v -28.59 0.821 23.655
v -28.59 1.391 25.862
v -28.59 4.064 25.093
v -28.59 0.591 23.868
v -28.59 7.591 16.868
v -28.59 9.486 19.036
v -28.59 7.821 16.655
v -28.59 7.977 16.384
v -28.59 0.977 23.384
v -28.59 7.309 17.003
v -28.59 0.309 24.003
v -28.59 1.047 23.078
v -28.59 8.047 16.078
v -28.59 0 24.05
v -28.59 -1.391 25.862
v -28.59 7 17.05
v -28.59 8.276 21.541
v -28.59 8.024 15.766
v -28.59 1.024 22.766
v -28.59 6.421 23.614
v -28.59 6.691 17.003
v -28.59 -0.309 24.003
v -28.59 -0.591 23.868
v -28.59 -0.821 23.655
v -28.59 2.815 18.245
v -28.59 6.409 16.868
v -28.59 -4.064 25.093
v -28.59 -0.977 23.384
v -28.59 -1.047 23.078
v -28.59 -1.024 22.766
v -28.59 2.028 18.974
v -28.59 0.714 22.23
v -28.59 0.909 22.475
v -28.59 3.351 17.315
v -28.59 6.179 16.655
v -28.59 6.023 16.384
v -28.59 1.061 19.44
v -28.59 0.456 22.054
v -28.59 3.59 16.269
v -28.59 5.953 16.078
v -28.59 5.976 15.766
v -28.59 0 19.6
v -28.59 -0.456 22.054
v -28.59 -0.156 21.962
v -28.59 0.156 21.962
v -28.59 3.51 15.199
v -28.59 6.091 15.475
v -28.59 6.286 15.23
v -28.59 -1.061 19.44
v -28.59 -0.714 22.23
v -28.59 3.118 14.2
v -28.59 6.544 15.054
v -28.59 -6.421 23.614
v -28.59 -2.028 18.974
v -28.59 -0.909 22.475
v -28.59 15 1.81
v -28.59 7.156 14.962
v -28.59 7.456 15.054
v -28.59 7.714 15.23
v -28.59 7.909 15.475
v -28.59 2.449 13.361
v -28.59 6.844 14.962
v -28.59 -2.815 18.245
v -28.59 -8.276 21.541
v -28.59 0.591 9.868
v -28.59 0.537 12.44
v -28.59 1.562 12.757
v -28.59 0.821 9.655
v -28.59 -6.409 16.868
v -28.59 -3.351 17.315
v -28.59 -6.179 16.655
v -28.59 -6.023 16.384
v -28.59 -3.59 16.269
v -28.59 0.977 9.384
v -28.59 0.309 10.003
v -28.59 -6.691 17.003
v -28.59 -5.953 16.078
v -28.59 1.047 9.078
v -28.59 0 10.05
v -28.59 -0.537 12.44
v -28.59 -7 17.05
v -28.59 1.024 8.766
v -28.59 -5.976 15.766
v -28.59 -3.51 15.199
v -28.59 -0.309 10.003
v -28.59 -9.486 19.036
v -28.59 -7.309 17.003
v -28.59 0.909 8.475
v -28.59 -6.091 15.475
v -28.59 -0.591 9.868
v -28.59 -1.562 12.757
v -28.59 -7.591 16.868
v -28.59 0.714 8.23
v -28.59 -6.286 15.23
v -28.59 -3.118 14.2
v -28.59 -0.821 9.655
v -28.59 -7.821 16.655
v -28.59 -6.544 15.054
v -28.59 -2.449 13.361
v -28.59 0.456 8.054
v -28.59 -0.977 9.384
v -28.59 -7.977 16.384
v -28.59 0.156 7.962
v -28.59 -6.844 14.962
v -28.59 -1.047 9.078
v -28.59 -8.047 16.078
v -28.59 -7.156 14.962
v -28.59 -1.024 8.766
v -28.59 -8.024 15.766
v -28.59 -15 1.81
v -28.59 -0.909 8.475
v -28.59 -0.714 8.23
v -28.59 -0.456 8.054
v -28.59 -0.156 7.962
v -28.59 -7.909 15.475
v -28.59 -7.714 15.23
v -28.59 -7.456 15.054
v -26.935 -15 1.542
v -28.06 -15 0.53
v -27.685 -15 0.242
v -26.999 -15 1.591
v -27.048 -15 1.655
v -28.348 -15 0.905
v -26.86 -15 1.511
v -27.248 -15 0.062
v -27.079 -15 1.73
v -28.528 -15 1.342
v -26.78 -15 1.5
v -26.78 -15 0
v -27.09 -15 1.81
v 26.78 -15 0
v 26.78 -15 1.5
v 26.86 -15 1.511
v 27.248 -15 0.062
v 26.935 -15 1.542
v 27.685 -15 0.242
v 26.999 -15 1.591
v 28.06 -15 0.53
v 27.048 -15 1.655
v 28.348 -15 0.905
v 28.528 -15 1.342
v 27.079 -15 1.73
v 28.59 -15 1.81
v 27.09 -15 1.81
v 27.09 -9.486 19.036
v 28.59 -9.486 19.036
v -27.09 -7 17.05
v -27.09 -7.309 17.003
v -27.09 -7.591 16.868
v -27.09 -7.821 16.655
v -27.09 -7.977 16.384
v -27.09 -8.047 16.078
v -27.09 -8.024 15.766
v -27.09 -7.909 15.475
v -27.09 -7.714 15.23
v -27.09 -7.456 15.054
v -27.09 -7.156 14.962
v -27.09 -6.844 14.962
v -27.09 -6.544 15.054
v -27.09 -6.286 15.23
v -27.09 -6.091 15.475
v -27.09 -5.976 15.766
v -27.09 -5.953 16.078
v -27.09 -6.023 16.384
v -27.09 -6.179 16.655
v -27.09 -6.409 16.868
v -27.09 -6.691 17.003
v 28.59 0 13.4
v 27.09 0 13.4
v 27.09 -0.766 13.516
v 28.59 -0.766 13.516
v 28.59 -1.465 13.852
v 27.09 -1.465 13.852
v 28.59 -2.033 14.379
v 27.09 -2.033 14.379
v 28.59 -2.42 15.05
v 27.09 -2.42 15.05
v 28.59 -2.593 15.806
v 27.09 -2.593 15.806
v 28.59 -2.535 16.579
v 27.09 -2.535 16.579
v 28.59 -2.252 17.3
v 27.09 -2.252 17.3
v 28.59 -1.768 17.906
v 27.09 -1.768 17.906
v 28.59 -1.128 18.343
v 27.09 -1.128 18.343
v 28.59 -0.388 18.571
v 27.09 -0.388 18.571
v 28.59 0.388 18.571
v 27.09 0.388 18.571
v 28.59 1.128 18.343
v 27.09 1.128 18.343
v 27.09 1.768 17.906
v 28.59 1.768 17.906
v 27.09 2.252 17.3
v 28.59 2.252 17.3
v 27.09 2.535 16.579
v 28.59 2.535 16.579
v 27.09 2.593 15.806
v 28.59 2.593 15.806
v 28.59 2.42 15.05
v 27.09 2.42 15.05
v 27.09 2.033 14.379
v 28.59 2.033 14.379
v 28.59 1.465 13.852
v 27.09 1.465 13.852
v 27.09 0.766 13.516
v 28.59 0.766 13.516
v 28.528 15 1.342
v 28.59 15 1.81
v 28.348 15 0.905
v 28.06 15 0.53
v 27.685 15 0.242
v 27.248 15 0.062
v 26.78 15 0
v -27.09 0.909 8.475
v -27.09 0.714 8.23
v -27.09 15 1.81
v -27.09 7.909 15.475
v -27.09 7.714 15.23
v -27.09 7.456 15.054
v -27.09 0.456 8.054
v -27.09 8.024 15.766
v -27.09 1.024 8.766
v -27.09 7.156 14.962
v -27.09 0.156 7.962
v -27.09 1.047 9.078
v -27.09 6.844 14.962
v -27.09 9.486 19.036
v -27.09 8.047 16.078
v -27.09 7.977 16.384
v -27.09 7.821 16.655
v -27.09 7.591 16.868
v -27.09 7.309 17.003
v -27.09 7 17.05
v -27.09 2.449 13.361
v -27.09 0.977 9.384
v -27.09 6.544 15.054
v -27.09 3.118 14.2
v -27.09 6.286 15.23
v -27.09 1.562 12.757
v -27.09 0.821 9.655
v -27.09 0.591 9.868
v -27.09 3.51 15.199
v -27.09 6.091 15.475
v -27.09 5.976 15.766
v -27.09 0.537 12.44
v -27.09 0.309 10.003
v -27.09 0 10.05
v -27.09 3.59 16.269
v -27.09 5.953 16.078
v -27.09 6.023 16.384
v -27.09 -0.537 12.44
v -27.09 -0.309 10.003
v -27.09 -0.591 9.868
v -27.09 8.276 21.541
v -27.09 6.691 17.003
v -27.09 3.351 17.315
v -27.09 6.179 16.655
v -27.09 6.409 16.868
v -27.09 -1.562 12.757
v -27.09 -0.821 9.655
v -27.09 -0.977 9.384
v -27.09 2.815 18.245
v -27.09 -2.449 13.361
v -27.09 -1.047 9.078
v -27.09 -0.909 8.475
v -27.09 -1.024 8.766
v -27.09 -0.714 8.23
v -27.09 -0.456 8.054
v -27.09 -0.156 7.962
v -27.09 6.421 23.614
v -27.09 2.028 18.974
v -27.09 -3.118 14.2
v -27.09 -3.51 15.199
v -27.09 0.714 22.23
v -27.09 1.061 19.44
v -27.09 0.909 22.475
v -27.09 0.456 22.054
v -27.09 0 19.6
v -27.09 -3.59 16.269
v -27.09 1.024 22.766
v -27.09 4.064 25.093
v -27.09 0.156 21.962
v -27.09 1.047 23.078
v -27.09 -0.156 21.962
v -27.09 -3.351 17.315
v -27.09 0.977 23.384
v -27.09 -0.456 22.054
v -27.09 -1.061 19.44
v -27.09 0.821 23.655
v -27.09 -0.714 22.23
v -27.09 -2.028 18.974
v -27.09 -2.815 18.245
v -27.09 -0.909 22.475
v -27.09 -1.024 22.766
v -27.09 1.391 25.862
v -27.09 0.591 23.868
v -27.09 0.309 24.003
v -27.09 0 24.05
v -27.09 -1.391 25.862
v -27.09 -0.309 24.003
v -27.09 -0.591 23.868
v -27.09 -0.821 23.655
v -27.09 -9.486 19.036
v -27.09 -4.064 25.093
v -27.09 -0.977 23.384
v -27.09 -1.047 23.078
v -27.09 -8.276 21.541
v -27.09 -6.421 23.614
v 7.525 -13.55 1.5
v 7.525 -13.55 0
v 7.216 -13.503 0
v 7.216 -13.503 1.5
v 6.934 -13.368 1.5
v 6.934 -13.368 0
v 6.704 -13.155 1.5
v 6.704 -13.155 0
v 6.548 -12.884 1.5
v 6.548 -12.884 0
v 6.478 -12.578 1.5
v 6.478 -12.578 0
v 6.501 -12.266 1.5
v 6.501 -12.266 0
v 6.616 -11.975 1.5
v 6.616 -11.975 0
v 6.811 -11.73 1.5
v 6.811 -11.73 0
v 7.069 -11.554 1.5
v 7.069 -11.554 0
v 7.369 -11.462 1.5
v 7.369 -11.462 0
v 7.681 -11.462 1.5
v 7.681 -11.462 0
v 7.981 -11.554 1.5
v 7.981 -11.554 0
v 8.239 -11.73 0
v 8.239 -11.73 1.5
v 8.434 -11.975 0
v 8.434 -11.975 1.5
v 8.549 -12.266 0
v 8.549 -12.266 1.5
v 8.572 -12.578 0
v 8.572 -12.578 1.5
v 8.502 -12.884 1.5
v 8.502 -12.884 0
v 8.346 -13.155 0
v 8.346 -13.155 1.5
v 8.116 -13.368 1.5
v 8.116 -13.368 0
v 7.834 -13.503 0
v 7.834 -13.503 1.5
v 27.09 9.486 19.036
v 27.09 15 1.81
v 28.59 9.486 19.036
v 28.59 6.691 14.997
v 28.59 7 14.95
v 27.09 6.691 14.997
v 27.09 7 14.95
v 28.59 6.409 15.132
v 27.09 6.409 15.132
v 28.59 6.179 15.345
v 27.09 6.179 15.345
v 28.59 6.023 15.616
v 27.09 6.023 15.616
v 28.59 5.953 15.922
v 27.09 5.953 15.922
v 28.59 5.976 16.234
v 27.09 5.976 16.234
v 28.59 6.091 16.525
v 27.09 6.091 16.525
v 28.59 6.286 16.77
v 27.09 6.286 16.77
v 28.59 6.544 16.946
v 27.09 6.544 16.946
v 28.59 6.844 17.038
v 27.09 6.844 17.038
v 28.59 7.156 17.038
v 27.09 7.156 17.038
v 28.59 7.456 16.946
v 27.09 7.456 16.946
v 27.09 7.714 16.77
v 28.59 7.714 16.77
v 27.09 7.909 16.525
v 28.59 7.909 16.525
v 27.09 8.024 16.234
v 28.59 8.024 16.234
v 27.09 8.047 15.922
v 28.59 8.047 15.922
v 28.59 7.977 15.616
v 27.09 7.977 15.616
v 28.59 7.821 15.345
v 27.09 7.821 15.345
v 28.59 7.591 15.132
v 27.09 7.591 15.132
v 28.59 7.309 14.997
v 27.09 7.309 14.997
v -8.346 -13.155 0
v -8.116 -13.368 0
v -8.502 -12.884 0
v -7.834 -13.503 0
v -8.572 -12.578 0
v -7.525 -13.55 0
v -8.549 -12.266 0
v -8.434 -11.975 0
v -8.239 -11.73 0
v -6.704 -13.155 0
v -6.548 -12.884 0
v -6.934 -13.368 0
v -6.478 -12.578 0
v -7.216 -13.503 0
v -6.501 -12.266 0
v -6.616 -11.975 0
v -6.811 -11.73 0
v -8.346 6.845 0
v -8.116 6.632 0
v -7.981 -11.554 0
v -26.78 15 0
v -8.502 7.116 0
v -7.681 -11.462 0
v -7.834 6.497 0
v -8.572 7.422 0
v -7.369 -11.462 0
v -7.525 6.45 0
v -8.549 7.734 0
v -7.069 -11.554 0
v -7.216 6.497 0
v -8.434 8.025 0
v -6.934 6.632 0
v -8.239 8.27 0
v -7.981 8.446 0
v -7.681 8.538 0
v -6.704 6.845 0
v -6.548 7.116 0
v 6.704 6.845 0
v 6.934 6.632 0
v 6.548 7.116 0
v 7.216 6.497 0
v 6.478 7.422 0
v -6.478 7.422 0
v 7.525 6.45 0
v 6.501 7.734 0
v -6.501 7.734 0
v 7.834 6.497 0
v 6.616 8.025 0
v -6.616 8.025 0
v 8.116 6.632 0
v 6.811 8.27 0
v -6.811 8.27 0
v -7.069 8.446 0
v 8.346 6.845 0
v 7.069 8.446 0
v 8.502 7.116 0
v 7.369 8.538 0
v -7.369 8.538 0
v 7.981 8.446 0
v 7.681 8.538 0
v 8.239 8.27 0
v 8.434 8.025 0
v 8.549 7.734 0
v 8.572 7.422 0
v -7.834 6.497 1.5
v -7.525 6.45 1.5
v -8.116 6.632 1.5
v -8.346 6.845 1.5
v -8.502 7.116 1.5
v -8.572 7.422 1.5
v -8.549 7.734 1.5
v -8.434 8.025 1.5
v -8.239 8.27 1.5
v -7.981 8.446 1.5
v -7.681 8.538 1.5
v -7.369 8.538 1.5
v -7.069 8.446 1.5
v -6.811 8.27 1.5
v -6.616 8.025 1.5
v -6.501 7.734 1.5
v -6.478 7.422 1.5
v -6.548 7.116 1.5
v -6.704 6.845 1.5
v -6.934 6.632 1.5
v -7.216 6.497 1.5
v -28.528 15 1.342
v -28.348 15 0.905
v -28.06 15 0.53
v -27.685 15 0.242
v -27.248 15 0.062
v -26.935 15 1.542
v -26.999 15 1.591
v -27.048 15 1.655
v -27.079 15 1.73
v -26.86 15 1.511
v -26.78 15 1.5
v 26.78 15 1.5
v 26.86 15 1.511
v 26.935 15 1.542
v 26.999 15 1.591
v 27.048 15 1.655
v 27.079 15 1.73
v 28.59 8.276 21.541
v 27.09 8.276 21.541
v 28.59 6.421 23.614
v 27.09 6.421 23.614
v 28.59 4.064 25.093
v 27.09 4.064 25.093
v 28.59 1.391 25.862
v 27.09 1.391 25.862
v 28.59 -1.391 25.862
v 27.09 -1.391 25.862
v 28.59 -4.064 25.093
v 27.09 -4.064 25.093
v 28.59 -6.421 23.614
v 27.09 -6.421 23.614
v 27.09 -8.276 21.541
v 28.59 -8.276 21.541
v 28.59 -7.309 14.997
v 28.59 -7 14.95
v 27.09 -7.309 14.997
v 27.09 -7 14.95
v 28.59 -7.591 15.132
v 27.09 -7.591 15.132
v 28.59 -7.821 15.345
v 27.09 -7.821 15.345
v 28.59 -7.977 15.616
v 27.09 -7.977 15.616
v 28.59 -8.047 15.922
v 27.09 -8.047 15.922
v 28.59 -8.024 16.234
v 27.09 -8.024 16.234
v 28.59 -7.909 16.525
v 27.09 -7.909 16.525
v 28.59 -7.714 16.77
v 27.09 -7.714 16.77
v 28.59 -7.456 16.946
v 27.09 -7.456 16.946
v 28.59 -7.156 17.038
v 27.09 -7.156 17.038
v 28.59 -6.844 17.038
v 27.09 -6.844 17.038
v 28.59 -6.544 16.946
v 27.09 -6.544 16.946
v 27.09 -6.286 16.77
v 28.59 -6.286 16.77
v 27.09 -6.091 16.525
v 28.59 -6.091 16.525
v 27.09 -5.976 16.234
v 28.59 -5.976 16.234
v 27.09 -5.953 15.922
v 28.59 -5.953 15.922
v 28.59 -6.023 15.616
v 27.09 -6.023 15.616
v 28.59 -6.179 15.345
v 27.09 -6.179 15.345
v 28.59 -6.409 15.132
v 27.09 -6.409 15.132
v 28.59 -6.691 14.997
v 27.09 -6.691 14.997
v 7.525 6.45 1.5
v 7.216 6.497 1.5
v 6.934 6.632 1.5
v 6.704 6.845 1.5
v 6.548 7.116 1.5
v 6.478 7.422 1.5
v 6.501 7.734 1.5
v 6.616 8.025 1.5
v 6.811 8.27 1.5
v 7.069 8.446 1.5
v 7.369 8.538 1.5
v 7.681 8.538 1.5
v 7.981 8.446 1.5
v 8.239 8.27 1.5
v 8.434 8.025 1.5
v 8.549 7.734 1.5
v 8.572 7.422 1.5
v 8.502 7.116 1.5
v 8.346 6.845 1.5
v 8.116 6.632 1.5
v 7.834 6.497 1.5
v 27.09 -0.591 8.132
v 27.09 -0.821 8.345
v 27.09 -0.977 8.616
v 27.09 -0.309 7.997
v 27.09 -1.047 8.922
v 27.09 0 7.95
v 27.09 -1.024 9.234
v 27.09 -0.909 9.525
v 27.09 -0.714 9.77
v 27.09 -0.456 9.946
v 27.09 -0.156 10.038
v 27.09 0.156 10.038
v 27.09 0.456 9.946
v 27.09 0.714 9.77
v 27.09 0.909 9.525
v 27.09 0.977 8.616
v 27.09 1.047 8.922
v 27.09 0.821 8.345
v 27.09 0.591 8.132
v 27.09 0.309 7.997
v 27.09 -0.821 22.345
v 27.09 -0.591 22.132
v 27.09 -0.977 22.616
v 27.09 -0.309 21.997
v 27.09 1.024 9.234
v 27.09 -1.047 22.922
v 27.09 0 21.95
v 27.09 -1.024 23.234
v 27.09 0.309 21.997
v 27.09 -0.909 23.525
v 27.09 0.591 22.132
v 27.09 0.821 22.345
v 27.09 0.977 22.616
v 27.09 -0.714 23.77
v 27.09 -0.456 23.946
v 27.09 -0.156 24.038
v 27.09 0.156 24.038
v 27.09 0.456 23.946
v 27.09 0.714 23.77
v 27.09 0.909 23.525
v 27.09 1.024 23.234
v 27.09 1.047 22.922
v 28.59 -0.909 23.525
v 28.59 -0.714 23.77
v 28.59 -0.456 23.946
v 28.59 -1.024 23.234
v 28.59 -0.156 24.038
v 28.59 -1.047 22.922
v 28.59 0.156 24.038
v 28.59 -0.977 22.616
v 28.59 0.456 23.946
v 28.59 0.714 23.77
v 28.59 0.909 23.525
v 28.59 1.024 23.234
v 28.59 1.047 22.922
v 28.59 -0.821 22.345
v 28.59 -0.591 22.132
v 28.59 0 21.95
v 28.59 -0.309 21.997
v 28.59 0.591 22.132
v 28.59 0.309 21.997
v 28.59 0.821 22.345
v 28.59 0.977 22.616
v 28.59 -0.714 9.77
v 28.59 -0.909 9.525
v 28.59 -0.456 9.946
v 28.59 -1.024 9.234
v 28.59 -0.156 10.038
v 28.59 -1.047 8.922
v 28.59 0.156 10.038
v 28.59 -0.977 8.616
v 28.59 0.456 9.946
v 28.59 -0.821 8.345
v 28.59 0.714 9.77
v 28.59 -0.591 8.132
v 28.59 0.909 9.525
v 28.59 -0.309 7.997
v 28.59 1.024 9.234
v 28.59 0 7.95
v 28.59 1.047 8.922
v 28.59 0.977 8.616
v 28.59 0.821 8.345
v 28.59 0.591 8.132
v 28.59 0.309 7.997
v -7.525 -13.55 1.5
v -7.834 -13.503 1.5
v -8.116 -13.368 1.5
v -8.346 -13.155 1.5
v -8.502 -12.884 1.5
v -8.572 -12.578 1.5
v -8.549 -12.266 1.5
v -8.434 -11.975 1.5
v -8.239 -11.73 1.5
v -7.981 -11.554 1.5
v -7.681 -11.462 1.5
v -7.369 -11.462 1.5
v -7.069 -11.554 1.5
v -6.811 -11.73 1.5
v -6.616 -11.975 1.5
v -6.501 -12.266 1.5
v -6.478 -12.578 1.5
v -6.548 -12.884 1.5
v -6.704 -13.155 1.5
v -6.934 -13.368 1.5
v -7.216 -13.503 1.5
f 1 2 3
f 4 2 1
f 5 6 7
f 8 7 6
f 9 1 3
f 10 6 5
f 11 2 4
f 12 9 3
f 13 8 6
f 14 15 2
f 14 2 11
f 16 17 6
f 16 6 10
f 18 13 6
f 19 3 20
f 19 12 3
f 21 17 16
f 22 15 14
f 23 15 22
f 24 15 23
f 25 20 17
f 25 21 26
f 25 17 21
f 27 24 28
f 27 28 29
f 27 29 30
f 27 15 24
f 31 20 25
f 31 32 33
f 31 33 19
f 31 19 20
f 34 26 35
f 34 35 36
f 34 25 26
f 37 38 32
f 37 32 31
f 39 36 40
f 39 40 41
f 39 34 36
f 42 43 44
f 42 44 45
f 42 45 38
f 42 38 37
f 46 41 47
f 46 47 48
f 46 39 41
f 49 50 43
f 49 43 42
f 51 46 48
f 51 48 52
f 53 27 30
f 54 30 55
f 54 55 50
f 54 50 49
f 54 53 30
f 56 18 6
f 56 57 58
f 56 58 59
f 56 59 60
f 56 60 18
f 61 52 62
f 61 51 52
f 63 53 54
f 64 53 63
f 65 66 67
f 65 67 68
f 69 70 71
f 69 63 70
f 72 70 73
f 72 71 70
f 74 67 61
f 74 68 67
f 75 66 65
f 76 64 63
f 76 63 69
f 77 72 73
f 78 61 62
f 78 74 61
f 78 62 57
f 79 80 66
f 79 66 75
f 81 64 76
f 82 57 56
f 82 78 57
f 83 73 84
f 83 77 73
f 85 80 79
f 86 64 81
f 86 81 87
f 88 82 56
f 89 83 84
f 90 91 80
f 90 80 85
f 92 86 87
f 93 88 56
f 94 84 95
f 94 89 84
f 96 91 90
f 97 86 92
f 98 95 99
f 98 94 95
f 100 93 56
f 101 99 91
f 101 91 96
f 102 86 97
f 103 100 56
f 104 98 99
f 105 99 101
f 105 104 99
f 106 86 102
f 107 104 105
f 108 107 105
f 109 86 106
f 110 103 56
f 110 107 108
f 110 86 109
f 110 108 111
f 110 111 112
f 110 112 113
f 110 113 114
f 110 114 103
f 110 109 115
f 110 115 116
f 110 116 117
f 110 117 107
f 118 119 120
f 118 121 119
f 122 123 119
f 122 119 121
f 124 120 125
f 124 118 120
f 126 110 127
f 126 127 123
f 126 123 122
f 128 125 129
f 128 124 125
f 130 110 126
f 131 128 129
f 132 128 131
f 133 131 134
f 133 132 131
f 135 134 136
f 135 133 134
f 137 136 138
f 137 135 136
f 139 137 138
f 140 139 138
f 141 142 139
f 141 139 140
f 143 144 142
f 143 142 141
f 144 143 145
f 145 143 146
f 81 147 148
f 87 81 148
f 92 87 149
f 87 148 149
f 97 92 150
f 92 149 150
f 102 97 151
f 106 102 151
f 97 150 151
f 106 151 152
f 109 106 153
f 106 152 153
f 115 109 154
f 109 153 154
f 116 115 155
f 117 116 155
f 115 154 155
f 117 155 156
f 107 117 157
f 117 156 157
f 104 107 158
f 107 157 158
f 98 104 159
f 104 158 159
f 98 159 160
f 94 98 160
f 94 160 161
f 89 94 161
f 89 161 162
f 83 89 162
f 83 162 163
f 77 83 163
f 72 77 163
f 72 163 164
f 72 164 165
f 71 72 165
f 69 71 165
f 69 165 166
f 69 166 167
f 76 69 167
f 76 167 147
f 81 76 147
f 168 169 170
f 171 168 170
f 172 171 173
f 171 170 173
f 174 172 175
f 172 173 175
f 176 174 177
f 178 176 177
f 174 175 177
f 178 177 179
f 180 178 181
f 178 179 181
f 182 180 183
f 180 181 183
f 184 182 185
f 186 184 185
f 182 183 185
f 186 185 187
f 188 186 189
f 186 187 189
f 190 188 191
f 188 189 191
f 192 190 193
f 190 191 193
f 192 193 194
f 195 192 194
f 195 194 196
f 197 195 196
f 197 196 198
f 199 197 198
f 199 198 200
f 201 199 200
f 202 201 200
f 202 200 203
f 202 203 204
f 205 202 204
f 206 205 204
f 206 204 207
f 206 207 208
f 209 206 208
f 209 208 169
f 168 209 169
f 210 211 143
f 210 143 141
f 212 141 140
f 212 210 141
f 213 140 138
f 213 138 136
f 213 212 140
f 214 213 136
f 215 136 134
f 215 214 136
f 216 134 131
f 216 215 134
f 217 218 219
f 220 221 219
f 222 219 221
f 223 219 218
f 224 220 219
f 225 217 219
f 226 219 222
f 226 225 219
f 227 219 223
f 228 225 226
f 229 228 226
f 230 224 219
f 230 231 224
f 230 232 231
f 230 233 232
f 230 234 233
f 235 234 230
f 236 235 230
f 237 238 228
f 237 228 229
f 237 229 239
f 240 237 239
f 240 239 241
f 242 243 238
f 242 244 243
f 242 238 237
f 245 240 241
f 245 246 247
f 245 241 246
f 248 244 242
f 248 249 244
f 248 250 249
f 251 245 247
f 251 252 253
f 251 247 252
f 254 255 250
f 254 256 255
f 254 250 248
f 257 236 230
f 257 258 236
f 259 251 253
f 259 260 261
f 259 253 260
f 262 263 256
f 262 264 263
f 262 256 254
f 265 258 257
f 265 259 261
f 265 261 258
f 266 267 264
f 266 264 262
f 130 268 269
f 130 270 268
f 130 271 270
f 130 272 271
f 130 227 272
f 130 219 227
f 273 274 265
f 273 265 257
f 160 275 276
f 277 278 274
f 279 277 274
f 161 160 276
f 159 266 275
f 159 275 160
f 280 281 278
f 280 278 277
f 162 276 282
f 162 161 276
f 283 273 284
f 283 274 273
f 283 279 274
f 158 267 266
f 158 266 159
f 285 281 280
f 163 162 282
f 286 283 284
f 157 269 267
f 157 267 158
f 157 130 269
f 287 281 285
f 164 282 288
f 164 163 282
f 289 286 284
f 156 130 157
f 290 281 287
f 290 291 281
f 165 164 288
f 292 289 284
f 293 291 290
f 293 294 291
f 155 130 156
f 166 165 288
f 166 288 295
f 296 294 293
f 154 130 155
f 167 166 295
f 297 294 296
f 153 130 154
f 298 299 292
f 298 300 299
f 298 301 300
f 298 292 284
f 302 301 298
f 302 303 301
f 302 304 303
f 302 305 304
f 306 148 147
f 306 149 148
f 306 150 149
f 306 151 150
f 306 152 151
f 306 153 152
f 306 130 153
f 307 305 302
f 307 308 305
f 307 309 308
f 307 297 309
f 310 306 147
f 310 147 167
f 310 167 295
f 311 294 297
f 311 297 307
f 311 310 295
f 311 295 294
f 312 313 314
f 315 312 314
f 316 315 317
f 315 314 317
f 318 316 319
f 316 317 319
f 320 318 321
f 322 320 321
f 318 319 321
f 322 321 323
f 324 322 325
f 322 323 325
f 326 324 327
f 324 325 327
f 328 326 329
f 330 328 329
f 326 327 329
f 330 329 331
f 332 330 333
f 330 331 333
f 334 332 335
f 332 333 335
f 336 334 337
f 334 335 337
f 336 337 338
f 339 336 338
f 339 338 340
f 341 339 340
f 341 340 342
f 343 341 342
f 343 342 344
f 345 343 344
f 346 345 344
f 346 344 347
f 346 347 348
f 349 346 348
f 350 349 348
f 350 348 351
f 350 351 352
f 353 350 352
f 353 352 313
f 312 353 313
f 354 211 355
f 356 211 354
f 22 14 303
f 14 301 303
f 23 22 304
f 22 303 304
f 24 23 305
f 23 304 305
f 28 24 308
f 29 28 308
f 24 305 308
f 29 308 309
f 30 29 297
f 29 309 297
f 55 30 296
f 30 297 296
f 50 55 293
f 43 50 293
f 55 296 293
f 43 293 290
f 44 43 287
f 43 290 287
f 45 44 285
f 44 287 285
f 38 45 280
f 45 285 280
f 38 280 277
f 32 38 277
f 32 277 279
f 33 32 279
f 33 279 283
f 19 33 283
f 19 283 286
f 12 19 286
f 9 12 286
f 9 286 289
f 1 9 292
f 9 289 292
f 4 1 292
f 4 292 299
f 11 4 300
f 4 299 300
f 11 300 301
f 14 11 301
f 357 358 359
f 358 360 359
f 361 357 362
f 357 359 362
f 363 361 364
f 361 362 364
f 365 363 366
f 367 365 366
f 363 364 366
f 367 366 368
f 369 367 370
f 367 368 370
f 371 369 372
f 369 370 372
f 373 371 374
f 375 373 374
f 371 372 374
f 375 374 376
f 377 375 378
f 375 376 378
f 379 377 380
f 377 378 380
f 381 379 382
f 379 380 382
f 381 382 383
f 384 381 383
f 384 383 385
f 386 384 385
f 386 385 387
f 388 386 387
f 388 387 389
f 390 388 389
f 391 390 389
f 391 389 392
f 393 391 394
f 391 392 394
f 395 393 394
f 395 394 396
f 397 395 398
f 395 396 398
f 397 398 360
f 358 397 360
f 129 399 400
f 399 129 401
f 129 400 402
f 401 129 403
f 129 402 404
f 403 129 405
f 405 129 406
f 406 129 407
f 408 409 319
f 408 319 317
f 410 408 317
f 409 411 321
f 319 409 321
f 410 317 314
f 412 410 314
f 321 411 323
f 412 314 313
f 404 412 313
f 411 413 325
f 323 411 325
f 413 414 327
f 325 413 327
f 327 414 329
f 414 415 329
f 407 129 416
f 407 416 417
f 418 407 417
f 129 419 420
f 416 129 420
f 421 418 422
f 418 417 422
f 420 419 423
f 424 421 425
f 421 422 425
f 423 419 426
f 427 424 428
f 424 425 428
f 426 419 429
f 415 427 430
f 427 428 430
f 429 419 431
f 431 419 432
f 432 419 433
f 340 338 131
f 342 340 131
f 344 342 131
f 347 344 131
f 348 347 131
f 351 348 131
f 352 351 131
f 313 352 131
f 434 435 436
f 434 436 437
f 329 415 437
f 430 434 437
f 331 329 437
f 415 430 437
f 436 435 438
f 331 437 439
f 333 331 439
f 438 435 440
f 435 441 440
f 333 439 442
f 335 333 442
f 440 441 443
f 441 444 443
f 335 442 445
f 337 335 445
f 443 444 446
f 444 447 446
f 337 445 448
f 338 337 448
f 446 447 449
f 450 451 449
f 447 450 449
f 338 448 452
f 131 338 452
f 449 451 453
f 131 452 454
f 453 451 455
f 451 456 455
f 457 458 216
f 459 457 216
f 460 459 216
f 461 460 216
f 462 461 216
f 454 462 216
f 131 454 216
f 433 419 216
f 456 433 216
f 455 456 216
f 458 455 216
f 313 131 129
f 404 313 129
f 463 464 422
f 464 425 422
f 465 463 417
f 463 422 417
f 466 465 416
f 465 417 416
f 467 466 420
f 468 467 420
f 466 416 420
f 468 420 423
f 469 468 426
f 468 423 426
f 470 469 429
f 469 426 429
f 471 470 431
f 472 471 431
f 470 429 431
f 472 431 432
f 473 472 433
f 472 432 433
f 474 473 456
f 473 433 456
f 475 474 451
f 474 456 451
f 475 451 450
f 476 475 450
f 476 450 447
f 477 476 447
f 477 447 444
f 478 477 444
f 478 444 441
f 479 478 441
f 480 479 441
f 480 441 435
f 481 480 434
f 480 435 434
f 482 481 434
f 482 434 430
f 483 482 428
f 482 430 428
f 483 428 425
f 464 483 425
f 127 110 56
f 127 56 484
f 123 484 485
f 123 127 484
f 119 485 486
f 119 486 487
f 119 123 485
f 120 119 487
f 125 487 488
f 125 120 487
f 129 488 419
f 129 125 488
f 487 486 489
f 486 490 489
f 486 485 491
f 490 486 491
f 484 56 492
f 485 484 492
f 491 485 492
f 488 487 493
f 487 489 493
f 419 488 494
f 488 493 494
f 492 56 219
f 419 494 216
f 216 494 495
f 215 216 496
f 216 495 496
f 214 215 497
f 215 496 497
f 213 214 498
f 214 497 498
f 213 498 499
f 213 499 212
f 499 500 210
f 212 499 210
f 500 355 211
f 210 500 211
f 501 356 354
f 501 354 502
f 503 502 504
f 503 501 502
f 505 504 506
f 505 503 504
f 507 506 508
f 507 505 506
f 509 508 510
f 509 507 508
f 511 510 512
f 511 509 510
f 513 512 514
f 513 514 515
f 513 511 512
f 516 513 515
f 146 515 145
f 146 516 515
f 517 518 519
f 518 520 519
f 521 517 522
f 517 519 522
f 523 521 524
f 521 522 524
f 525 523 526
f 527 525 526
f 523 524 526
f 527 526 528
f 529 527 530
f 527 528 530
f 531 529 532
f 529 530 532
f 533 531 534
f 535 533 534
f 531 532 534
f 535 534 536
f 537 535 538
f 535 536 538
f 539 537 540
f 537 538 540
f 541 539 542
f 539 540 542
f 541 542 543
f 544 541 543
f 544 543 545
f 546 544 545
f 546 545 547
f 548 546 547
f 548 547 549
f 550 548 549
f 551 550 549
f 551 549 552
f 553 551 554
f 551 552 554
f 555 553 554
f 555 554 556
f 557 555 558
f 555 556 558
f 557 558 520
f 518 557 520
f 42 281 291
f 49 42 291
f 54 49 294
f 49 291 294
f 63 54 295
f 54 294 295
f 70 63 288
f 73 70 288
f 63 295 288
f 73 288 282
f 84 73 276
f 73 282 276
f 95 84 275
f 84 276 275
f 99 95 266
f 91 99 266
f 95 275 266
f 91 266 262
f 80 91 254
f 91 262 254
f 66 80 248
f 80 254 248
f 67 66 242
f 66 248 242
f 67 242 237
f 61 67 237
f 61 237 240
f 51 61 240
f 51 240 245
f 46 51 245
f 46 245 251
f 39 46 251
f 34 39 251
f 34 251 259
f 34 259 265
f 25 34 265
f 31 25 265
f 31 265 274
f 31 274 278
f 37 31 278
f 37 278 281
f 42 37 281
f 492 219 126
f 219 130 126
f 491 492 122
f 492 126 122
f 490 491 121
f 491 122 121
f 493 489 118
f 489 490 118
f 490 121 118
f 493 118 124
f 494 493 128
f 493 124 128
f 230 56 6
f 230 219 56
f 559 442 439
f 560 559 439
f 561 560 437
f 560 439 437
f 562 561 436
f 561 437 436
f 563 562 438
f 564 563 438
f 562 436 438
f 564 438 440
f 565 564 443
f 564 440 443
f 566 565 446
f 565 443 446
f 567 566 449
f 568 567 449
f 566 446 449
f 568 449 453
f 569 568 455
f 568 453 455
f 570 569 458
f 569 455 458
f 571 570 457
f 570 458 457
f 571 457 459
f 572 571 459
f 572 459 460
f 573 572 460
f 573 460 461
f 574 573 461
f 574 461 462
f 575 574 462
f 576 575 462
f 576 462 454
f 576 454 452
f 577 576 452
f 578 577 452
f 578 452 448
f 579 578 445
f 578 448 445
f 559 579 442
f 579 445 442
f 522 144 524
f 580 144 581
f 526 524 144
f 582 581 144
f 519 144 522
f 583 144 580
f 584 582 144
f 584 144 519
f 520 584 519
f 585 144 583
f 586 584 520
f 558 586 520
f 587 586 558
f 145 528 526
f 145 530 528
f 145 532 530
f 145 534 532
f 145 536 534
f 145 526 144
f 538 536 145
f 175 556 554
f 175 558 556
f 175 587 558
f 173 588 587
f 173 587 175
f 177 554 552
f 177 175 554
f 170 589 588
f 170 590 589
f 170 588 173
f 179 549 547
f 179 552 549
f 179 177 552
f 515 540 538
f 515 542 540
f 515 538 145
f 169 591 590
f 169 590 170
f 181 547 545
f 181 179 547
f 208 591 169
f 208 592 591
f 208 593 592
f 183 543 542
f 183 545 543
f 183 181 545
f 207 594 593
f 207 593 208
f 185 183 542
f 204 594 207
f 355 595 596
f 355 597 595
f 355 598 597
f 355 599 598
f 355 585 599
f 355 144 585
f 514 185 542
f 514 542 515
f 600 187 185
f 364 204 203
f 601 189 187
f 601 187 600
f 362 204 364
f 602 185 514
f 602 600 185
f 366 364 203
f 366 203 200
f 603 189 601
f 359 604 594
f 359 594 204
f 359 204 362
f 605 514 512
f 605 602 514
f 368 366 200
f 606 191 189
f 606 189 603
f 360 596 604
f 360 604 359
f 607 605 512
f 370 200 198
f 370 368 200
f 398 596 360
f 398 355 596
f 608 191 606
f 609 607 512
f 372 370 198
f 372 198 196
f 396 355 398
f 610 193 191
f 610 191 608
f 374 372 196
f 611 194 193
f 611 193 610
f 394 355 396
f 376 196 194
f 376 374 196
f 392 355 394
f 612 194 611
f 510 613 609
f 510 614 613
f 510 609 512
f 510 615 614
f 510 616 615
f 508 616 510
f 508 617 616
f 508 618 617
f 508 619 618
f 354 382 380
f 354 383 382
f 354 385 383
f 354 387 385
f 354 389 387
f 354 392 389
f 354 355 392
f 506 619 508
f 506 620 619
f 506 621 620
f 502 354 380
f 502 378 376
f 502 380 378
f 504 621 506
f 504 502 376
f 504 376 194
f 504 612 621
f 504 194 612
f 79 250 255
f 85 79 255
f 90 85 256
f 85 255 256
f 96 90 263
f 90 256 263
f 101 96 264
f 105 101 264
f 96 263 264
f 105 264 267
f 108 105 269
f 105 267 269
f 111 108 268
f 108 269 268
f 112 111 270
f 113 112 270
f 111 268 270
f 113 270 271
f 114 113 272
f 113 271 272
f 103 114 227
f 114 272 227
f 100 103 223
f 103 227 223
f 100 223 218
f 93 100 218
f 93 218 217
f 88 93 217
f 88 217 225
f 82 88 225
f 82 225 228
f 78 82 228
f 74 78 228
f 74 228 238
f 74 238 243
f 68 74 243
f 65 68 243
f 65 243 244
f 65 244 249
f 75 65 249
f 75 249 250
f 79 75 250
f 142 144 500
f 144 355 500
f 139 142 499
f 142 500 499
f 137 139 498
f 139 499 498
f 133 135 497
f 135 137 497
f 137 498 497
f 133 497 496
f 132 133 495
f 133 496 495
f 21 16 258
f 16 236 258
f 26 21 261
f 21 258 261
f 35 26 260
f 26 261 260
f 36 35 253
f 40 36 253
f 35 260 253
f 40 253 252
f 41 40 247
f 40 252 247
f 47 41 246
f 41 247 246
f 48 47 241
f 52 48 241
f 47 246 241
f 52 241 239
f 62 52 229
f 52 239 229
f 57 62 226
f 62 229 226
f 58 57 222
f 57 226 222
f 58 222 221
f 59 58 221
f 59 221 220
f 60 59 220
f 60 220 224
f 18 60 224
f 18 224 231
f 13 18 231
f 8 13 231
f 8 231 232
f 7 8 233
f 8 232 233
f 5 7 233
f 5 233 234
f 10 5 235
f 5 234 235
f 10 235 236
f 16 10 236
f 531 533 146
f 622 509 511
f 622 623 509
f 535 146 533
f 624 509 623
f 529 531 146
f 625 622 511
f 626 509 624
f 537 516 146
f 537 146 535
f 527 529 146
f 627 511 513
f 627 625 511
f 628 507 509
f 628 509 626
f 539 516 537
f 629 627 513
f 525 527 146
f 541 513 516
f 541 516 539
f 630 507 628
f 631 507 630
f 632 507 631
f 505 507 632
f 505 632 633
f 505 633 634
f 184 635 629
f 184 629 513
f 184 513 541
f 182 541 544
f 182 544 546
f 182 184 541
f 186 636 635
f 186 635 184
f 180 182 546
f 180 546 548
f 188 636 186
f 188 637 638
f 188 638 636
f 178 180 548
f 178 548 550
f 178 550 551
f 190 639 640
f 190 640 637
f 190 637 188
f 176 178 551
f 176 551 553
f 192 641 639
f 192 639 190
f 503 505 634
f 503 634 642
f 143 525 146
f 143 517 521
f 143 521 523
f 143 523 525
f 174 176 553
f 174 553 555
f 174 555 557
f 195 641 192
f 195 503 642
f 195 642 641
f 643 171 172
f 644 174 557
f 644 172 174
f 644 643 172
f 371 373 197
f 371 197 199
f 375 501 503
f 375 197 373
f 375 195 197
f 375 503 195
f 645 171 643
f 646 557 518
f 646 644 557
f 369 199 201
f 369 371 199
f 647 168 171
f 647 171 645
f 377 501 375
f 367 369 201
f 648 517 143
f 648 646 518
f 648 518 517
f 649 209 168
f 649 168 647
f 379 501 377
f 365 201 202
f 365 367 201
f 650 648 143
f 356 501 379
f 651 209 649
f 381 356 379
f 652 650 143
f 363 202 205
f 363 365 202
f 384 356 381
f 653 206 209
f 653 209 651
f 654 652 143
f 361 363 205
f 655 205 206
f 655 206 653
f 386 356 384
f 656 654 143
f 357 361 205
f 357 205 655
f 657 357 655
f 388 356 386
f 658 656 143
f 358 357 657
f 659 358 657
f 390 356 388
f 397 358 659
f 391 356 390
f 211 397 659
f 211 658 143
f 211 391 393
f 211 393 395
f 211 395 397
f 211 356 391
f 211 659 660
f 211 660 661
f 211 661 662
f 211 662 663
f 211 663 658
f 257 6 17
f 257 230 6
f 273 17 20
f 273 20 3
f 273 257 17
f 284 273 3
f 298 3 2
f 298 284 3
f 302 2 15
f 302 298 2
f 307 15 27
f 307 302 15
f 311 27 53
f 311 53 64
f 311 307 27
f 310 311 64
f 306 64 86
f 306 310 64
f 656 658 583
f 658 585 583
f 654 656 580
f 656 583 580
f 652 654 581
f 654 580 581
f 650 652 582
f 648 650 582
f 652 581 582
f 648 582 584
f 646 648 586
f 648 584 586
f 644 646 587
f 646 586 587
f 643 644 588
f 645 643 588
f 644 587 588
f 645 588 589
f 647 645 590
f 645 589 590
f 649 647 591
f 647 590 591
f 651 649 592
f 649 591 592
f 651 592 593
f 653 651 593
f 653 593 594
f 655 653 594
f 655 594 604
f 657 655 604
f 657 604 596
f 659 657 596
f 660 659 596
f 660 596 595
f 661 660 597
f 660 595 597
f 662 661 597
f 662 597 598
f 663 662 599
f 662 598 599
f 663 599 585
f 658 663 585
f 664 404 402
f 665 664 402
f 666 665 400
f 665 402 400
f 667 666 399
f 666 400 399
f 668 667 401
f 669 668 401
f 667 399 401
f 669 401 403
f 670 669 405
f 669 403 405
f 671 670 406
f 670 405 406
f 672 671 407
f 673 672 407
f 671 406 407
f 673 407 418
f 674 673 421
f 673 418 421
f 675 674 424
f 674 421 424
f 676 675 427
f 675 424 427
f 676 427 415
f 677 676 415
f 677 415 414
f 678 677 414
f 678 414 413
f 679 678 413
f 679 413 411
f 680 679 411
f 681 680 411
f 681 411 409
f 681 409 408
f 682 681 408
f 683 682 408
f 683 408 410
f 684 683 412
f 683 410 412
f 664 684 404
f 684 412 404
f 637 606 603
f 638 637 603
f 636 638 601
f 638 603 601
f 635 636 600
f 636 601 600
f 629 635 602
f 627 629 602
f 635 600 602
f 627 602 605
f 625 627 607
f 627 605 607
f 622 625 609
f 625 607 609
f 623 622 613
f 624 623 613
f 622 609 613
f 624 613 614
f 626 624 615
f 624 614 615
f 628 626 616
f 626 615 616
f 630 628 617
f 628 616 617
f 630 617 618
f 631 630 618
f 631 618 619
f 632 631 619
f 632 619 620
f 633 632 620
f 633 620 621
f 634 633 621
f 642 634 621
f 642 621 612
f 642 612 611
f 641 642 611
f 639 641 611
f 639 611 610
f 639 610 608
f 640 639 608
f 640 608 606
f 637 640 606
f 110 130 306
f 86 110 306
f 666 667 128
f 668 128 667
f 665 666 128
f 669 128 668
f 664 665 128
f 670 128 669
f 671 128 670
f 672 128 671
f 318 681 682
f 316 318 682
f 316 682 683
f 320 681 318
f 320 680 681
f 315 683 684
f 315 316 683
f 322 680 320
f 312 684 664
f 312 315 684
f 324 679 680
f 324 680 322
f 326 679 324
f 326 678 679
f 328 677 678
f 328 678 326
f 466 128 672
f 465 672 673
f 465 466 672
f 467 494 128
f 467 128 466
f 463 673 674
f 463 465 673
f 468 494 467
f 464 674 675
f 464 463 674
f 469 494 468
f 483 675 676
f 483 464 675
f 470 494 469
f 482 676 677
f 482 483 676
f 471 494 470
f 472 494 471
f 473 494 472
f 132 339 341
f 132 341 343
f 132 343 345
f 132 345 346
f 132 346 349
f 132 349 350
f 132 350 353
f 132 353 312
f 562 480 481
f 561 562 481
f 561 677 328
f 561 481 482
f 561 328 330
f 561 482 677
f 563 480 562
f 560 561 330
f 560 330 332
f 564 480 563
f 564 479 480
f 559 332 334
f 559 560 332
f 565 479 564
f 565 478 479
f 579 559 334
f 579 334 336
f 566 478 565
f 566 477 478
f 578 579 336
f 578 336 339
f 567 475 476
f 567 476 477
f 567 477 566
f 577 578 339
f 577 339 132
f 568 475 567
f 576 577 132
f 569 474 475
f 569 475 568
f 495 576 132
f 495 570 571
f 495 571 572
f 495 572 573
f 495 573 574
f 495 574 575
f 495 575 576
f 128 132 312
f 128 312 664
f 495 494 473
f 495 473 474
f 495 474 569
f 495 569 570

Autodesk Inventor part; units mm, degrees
ref_plane "YZ Plane" through (0, 0, 0) normal (1, 0, 0) x (0, 1, 0)
ref_plane "XZ Plane" through (0, 0, 0) normal (0, 1, 0) x (-1, 0, 0)
ref_plane "XY Plane" through (0, 0, 0) normal (0, 0, 1) x (1, 0, 0)
sketch "Sketch1" plane through (0, 0, 0) normal (0, 0, 1) x (1, 0, 0)
  line L0 (-28.59, -15) -> (28.59, -15)
  line L1 (28.59, -15) -> (28.59, 15)
  line L2 (28.59, 15) -> (-28.59, 15)
  line L3 (-28.59, 15) -> (-28.59, -15)
  line L4 (-28.59, -15) -> (28.59, 15) construction
  line L5 (28.59, -15) -> (-28.59, 15) construction
  point P0 (0, 0)
  dimension "d0" = 57.18
  dimension "d1" = 30
extrude "Plate1" add sketch "Sketch1" along normal blind 1.5
sketch "Sketch2" plane through (-27.09, -15, 0) normal (-1, 0, 0) x (0, -1, 0)
  line L0 (-30, 0) -> (0, 0)
  line L1 (0, 0) -> (0, 33)
  line L2 (0, 33) -> (-30, 33)
  line L3 (-30, 33) -> (-30, 0)
edge flange "Flange1" height 33 angle 90 thickness 1.5 bend radius 0.31 thickness toward (-1, 0, 0) relief tear relief width 1.5 relief depth 0.75 corner gap 0.31 corner form 0 edges at (-28.59, 0, 1.5) (28.59, 0, 1.5) wall of the first edge with corners at (-27.09, 15, 0) (-27.09, -15, 0) (-27.09, -15, 33) (-27.09, 15, 33)
bend "Bend1"
corner "Corner1"
sketch "Sketch3" plane through (28.59, -15, 33) normal (1, 0, 0) x (0, 0, -1)
  circle A0 centre (17, 15) radius 9.96
  line L0 (0, 30) -> (31.19, 30) projected
  line L1 (31.19, 0) -> (0, 0) projected
  line L2 (31.19, 30) -> (13.9636, 24.4859)
  line L3 (31.19, 0) -> (13.9636, 5.5141)
  line L4 (0, 30) -> (0, 0)
  point P0 (33, 15)
  dimension "d13" = 19.92
  dimension "d14" = 0
  dimension "d15" = 16
extrude "Cut1" cut sketch "Sketch3" against normal blind 57.18 contours A0 L3 L1 L4 L0 L2
sketch "Sketch17" plane through (28.59, -15, 1.81) normal (1, 0, 0) x (0, 0, -1)
  circle A0 centre (-21.19, 15) radius 0.7835 projected
  circle A1 centre (-14.19, 22) radius 0.7835 projected
  circle A2 centre (-7.19, 15) radius 0.7835 projected
  circle A3 centre (-14.19, 8) radius 0.7835 projected
  point P0 (1.81, 15)
hole "Hole7" at (28.59, 0, 23) at (28.59, 7, 16) at (28.59, 0, 9) at (28.59, -7, 16) direction (-1, 0, 0) diameter 2.1 depth 1.5
sketch "Sketch18" plane through (-28.59, -15, 1.81) normal (-1, 0, 0) x (0, 0, 1)
  circle A0 centre (14.19, 22) radius 0.7835 projected
  circle A1 centre (21.19, 15) radius 0.7835 projected
  circle A2 centre (14.19, 8) radius 0.7835 projected
  circle A3 centre (7.19, 15) radius 0.7835 projected
  point P0 (-1.81, 15)
hole "Hole8" at (-28.59, 7, 16) at (-28.59, 0, 23) at (-28.59, -7, 16) at (-28.59, 0, 9) direction (1, 0, 0) diameter 2.1 depth 1.5
sketch "Sketch19" plane through (0, 0, 1.5) normal (0, 0, 1) x (1, 0, 0)
  point P0 (0, 0)
sketch "Sketch21" plane through (-28.59, -15, 1.81) normal (-1, 0, 0) x (0, 0, 1)
  point P0 (-1.81, 15)
sketch "Sketch22" plane through (-28.59, -15, 1.81) normal (-1, 0, 0) x (0, 0, 1)
  circle A0 centre (14.19, 15) radius 1.75 projected
  point P0 (-1.81, 15)
sketch "Sketch23" plane through (-28.59, -15, 1.81) normal (-1, 0, 0) x (0, 0, 1)
  point P0 (-1.81, 15)
hole "Hole10" at (-28.59, 0, 16) direction (1, 0, 0) diameter 7.2 depth 1.5
sketch "Sketch24" plane through (28.59, -15, 1.81) normal (1, 0, 0) x (0, 0, -1)
  circle A0 centre (-14.19, 15) radius 1.2295 projected
  point P0 (1.81, 15)
hole "Hole11" at (28.59, 0, 16) direction (-1, 0, 0) diameter 5.2 depth 1.5
sketch "Sketch25" plane through (0, 0, 1.5) normal (0, 0, 1) x (1, 0, 0)
  circle A0 centre (7.525, 7.5) radius 0.7835
  circle A1 centre (7.525, -12.5) radius 0.7835
  circle A2 centre (-7.525, -12.5) radius 0.7835
  circle A3 centre (-7.525, 7.5) radius 0.7835
  point P0 (0, 0)
hole "Hole12" at (7.525, 7.5, 1.5) at (7.525, -12.5, 1.5) at (-7.525, 7.5, 1.5) at (-7.525, -12.5, 1.5) direction (0, 0, -1) diameter 2.1 depth 1.5
equation "\"d90\" = Thickness"
equation "\"d97\" = Thickness"
equation "\"d111\" = Thickness"
equation "\"d118\" = Thickness"
equation "\"d125\" = Thickness"
equation "\"d2\" = Thickness"
equation "\"d3\" = BendReliefWidth"
equation "\"d4\" = BendReliefDepth"
equation "\"d5\" = MinimumRemnant"
equation "\"d6\" = TransitionRadius"
equation "\"d9\" = BendRadius"
equation "\"d10\" = CornerReliefSize"
equation "\"d11\" = GapSize"
equation "\"d12\" = JacobiRadiusSize"
equation "\"BendReliefWidth\" = Thickness"
equation "\"BendReliefDepth\" = 0.5 * Thickness"
equation "\"CornerReliefSize\" = 4 * Thickness"
equation "\"MinimumRemnant\" = 2 * Thickness"
equation "\"TransitionRadius\" = BendRadius"
equation "\"JacobiRadiusSize\" = BendRadius"
equation "\"GapSize\" = Thickness"
equation "\"Thickness\" = 1.5"
equation "\"BendRadius\" = 0.31"
properties part number "axis_20_bottom_frame" material "Aluminum 6061-AHC"
